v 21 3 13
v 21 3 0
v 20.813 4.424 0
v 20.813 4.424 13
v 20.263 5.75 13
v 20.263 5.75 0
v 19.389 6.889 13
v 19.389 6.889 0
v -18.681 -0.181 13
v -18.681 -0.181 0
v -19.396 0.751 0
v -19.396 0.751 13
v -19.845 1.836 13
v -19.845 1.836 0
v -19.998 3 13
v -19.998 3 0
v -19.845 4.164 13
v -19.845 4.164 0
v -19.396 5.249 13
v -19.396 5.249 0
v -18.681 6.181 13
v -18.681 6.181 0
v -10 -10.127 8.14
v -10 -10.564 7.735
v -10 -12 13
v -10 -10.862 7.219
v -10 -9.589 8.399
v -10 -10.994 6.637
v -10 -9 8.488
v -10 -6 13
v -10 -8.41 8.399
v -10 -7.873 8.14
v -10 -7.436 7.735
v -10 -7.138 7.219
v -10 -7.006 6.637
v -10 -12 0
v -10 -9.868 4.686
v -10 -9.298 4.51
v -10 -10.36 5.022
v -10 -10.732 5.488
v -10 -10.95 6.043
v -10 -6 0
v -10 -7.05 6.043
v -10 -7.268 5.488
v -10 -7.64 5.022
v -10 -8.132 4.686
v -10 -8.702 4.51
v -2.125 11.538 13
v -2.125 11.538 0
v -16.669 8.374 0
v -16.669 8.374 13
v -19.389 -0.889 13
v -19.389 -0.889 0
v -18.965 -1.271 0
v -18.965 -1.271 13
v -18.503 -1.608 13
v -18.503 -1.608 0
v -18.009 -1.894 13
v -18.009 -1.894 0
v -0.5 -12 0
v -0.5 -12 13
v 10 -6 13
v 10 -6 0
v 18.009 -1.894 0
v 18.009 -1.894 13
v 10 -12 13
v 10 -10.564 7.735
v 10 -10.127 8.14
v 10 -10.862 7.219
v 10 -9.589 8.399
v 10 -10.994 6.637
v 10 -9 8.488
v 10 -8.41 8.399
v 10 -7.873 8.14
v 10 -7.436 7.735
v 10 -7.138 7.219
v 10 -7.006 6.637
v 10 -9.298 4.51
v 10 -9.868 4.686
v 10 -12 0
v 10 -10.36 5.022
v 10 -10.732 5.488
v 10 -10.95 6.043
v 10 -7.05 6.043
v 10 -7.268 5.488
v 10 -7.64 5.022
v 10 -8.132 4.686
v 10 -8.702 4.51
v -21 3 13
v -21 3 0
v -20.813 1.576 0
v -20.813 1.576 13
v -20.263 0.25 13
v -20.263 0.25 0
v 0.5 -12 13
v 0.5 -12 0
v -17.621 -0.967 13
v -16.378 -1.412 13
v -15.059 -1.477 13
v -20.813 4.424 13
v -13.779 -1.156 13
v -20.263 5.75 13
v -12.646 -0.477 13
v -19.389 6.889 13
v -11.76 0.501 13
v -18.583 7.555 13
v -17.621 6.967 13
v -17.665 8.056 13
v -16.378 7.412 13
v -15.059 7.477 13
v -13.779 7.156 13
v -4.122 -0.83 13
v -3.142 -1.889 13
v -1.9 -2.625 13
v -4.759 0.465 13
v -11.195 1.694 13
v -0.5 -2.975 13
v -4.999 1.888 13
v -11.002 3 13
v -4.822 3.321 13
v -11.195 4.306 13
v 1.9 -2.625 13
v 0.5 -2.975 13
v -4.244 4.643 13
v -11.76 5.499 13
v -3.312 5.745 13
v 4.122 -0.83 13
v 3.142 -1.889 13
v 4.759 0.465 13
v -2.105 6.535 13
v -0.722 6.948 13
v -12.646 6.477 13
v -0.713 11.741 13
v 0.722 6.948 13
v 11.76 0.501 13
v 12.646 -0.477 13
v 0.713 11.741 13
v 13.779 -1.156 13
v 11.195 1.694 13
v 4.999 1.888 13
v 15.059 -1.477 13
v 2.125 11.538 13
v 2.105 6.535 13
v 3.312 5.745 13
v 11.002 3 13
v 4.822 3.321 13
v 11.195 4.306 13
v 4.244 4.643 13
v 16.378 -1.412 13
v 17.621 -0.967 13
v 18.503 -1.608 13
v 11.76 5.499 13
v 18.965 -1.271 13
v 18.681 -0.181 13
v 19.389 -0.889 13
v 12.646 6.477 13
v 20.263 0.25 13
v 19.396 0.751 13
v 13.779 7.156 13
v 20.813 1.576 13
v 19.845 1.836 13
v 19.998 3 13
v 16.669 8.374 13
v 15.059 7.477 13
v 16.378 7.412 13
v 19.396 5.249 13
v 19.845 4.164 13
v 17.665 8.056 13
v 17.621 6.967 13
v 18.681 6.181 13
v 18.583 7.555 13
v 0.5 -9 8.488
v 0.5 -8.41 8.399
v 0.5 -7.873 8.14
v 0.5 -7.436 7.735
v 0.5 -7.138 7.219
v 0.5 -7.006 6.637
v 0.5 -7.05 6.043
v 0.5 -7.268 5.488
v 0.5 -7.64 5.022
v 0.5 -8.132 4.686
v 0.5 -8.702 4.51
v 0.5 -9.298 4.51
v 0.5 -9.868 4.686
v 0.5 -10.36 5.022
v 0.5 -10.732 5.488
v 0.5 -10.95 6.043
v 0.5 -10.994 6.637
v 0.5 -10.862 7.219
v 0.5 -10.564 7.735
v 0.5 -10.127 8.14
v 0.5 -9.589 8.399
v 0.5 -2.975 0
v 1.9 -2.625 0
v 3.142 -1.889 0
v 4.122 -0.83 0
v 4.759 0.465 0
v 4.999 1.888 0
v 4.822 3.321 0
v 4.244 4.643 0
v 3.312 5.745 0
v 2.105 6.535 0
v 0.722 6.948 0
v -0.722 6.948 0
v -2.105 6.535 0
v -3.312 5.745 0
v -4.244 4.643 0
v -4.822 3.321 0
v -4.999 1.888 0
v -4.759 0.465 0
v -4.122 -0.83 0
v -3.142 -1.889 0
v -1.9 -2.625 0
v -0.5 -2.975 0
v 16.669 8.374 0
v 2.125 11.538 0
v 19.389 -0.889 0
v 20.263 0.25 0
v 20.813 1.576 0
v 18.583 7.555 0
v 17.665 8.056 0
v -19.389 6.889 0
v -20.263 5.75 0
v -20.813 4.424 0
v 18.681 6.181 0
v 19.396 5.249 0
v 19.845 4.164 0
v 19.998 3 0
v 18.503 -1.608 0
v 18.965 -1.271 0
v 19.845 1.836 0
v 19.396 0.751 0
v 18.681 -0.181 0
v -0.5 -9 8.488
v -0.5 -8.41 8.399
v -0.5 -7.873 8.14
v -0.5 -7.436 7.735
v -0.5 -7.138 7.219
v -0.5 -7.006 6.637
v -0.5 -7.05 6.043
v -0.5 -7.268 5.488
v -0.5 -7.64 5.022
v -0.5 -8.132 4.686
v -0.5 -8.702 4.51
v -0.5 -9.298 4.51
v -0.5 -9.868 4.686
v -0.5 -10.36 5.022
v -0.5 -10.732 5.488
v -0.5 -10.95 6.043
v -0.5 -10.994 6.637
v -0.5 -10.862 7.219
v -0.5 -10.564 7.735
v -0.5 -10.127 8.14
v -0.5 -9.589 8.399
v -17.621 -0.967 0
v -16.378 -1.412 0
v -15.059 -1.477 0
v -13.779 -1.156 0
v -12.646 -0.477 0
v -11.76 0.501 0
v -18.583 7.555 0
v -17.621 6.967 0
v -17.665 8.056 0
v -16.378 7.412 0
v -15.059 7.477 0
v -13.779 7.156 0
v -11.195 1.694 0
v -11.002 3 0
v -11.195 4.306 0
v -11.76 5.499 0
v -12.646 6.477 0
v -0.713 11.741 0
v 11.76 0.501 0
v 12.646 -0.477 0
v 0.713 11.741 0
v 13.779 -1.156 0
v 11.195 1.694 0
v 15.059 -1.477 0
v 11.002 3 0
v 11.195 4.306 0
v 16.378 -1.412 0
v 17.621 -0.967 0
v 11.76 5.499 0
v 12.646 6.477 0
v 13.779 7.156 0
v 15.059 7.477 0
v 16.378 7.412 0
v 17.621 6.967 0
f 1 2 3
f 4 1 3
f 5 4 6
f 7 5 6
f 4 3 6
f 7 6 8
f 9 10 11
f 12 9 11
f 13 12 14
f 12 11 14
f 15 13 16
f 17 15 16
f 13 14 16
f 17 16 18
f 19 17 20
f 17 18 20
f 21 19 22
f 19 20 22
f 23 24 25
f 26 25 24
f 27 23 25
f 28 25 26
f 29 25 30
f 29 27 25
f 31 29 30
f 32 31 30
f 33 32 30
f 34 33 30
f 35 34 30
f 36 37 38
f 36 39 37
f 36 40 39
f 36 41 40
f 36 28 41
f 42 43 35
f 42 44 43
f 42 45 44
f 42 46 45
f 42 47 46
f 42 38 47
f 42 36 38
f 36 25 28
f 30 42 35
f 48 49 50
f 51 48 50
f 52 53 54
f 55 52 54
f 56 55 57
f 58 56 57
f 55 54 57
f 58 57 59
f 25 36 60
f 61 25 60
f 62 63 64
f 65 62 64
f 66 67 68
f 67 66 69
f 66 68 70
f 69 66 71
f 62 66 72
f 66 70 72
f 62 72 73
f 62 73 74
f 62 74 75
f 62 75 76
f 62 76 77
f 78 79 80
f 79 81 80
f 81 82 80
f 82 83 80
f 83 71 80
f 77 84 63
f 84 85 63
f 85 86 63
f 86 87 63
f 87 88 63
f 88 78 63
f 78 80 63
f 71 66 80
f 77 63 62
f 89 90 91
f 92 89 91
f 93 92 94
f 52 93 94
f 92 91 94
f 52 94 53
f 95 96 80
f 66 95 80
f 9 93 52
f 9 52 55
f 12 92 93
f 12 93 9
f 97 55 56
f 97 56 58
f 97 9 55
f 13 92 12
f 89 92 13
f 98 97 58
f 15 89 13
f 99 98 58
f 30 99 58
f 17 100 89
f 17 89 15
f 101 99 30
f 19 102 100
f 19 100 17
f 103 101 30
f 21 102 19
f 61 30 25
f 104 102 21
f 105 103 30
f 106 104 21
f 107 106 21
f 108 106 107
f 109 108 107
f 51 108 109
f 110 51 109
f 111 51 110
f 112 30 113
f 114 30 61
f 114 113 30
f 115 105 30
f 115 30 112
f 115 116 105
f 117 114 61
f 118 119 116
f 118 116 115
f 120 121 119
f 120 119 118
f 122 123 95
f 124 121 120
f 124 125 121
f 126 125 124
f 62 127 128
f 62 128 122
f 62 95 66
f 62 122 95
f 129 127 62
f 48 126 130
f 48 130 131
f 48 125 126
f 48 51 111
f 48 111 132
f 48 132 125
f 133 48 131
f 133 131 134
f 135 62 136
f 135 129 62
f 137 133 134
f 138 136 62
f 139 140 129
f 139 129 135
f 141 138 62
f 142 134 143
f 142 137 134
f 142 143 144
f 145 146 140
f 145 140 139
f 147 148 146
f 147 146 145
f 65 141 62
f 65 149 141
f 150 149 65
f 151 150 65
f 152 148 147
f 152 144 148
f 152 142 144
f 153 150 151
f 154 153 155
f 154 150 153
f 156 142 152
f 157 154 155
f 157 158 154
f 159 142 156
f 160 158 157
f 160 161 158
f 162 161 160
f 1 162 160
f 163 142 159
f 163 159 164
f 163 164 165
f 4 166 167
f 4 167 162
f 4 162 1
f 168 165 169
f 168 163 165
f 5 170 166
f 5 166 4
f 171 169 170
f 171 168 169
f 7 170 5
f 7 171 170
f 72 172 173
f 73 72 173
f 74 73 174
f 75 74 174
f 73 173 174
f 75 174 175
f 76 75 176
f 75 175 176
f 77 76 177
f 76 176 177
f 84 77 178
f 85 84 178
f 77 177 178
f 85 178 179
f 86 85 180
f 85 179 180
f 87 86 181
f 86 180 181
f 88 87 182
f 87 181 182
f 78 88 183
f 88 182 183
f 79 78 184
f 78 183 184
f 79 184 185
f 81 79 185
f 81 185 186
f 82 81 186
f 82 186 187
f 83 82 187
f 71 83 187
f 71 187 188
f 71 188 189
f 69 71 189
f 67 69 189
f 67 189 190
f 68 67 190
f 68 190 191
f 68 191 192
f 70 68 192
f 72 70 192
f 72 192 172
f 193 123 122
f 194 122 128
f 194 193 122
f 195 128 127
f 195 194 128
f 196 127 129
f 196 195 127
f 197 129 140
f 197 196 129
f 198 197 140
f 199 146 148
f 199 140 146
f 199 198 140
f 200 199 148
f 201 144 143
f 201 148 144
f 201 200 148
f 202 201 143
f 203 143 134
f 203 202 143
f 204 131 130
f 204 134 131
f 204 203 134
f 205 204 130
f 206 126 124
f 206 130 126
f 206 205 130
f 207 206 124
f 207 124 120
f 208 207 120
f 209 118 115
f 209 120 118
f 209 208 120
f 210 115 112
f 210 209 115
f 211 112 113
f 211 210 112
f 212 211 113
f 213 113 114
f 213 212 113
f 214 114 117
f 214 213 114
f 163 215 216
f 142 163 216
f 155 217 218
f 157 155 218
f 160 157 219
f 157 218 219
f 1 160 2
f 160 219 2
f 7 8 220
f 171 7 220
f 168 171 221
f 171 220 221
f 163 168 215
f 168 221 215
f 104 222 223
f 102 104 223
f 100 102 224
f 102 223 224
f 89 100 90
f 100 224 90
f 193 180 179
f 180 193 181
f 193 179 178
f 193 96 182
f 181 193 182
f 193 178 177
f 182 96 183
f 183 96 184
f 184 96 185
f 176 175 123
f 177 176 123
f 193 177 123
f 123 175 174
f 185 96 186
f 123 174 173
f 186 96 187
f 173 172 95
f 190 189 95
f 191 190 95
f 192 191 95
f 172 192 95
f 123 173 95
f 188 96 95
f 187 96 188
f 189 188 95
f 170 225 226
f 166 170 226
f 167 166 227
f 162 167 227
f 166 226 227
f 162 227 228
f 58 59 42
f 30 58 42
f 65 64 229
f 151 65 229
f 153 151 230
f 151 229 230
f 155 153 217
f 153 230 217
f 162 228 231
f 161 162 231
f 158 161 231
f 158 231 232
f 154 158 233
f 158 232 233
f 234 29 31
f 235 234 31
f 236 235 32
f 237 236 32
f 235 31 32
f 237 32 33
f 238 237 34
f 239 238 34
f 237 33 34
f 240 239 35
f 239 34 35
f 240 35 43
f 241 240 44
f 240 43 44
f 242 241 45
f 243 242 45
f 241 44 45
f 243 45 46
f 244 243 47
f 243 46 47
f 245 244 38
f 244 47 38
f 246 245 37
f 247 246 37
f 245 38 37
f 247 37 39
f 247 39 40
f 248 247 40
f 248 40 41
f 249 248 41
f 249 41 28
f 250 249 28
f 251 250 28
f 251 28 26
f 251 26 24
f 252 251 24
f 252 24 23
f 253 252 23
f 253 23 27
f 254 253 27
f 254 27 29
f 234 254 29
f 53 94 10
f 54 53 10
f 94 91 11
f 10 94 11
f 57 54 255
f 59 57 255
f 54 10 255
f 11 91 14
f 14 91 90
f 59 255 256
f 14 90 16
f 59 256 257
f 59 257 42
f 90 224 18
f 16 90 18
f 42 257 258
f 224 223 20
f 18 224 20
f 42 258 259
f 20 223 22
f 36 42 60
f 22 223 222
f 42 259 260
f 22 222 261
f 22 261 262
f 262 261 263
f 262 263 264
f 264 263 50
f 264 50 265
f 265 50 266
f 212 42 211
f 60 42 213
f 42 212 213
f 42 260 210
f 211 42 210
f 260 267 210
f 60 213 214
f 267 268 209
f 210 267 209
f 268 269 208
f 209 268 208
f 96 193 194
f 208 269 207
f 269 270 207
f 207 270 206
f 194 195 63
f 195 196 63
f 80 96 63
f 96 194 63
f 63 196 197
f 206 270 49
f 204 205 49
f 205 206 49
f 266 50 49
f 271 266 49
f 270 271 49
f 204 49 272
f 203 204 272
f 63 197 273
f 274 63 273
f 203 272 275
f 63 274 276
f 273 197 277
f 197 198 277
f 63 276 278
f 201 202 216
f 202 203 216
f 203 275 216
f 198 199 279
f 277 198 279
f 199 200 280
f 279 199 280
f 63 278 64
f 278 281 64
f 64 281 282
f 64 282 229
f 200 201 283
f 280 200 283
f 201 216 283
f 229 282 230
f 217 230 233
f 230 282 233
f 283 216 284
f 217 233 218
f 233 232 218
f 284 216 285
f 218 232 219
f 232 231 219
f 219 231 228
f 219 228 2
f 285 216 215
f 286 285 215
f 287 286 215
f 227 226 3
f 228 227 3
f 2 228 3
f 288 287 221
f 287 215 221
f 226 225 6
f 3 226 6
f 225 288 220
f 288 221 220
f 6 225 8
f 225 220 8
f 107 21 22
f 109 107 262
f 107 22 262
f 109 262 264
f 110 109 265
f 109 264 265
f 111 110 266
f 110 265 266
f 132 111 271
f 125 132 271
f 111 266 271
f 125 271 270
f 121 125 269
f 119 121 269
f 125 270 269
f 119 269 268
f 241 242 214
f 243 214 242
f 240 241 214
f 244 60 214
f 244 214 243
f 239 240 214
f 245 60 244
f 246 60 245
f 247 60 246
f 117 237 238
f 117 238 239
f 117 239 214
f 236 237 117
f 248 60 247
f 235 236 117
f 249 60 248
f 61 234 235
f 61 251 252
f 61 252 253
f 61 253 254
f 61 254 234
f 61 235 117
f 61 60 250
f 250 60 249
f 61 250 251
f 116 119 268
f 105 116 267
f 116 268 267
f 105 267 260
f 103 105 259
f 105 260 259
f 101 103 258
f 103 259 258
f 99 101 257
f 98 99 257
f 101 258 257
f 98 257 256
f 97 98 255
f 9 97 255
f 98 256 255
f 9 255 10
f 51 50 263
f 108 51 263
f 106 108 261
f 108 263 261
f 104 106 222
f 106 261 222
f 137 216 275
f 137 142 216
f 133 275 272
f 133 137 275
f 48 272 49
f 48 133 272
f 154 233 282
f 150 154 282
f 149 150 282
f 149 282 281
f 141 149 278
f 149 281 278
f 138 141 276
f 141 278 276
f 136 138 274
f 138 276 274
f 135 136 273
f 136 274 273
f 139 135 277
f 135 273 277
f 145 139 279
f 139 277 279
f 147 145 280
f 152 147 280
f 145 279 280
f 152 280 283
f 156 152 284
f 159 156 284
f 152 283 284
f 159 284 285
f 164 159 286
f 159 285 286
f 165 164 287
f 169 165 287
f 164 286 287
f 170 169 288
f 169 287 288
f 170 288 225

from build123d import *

# Parameters (mm, degrees)
SKETCH_1_R          = 5
SKETCH_1_W          = 19.999962028
SKETCH_1_H          = 6.000037038
EXTRUDE_1_DEPTH     = 13
SKETCH_2_R          = 2
CUT_EXTRUDE_1_DEPTH = 36.693120105
SKETCH_3_W          = 1
SKETCH_3_H          = 13
CUT_EXTRUDE_2_DEPTH = 13
FILLET_1_R          = 10


with BuildPart() as part:
    # 草图1 → 凸台-拉伸1 (new body)
    # profile 1 of 10: a face of its own
    with BuildSketch(Plane.XY):
        with BuildLine():
            ThreePointArc((18.008966142, -1.894393619), (10.046238322, 2.288323413), (16.668970702, 8.374337866))
            Line((16.668970702, 8.374337866), (0, 12))
            Line((0, 12), (-16.6689706, 8.374337888))
            ThreePointArc((-16.6689706, 8.374337888), (-12.048865281, 7.282483993), (-10, 3))
            ThreePointArc((-10, 3), (-12.632014098, -1.693043455), (-18.008966133, -1.894393624))
            Line((-18.008966133, -1.894393624), (-9.999981014, -5.999962962))
            Line((-9.999981014, -5.999962962), (9.999981014, -5.999962962))
            Line((9.999981014, -5.999962962), (18.008966142, -1.894393619))
        make_face()
        with Locations(Location((0, 2, 0), (0, 0, 180))):
            Circle(SKETCH_1_R, mode=Mode.SUBTRACT)
    # profile 2 of 10: a face of its own
    with BuildSketch(Plane.XY):
        with BuildLine():
            ThreePointArc((-10, 3), (-12.048865281, 7.282483993), (-16.6689706, 8.374337888))
            ThreePointArc((-16.6689706, 8.374337888), (-18.13580723, 7.827268404), (-19.389087297, 6.889087297))
            Line((-19.389087297, 6.889087297), (-18.680885962, 6.180885962))
            ThreePointArc((-18.680885962, 6.180885962), (-13.778516922, 7.156027793), (-11.001547932, 3))
            ThreePointArc((-11.001547932, 3), (-13.778516922, -1.156027793), (-18.680885962, -0.180885962))
            Line((-18.680885962, -0.180885962), (-19.389087297, -0.889087297))
            ThreePointArc((-19.389087297, -0.889087297), (-18.738276104, -1.445623452), (-18.008966133, -1.894393624))
            ThreePointArc((-18.008966133, -1.894393624), (-12.632014098, -1.693043455), (-10, 3))
        make_face()
    # profile 3 of 10: a face of its own
    with BuildSketch(Plane.XY):
        with BuildLine():
            Line((-18.680885962, 6.180885962), (-19.389087297, 6.889087297))
            ThreePointArc((-19.389087297, 6.889087297), (-20.581337429, 5.104758878), (-21, 3))
            ThreePointArc((-21, 3), (-20.581337429, 0.895241122), (-19.389087297, -0.889087297))
            Line((-19.389087297, -0.889087297), (-18.680885962, -0.180885962))
            ThreePointArc((-18.680885962, -0.180885962), (-19.998452068, 3), (-18.680885962, 6.180885962))
        make_face()
    # profile 4 of 10: a face of its own
    with BuildSketch(Plane.XY):
        with BuildLine():
            ThreePointArc((-10, 3), (-12.048865281, 7.282483993), (-16.6689706, 8.374337888))
            ThreePointArc((-16.6689706, 8.374337888), (-18.13580723, 7.827268404), (-19.389087297, 6.889087297))
            Line((-19.389087297, 6.889087297), (-18.680885962, 6.180885962))
            ThreePointArc((-18.680885962, 6.180885962), (-13.778516922, 7.156027793), (-11.001547932, 3))
            ThreePointArc((-11.001547932, 3), (-13.778516922, -1.156027793), (-18.680885962, -0.180885962))
            Line((-18.680885962, -0.180885962), (-19.389087297, -0.889087297))
            ThreePointArc((-19.389087297, -0.889087297), (-18.738276104, -1.445623452), (-18.008966133, -1.894393624))
            ThreePointArc((-18.008966133, -1.894393624), (-12.632014098, -1.693043455), (-10, 3))
        make_face()
    # profile 5 of 10: a face of its own
    with BuildSketch(Plane.XY):
        with BuildLine():
            Line((-18.680885962, 6.180885962), (-19.389087297, 6.889087297))
            ThreePointArc((-19.389087297, 6.889087297), (-20.581337429, 5.104758878), (-21, 3))
            ThreePointArc((-21, 3), (-20.581337429, 0.895241122), (-19.389087297, -0.889087297))
            Line((-19.389087297, -0.889087297), (-18.680885962, -0.180885962))
            ThreePointArc((-18.680885962, -0.180885962), (-19.998452068, 3), (-18.680885962, 6.180885962))
        make_face()
    # profile 6 of 10: a face of its own
    with BuildSketch(Plane.XY):
        with BuildLine():
            ThreePointArc((18.680885962, -0.180885962), (11.001547932, 3), (18.680885962, 6.180885962))
            Line((18.680885962, 6.180885962), (19.389087297, 6.889087297))
            ThreePointArc((19.389087297, 6.889087297), (18.135807275, 7.82726838), (16.668970702, 8.374337866))
            ThreePointArc((16.668970702, 8.374337866), (10.046238322, 2.288323413), (18.008966142, -1.894393619))
            ThreePointArc((18.008966142, -1.894393619), (18.738276108, -1.445623449), (19.389087297, -0.889087297))
            Line((19.389087297, -0.889087297), (18.680885962, -0.180885962))
        make_face()
    # profile 7 of 10: a face of its own
    with BuildSketch(Plane.XY):
        with BuildLine():
            Line((19.389087297, 6.889087297), (18.680885962, 6.180885962))
            ThreePointArc((18.680885962, 6.180885962), (19.656027793, 4.721483078), (19.998452068, 3))
            ThreePointArc((19.998452068, 3), (19.656027793, 1.278516922), (18.680885962, -0.180885962))
            Line((18.680885962, -0.180885962), (19.389087297, -0.889087297))
            ThreePointArc((19.389087297, -0.889087297), (20.581337429, 0.895241122), (21, 3))
            ThreePointArc((21, 3), (20.581337429, 5.104758878), (19.389087297, 6.889087297))
        make_face()
    # profile 8 of 10: a face of its own
    with BuildSketch(Plane.XY):
        with BuildLine():
            ThreePointArc((18.680885962, -0.180885962), (11.001547932, 3), (18.680885962, 6.180885962))
            Line((18.680885962, 6.180885962), (19.389087297, 6.889087297))
            ThreePointArc((19.389087297, 6.889087297), (18.135807275, 7.82726838), (16.668970702, 8.374337866))
            ThreePointArc((16.668970702, 8.374337866), (10.046238322, 2.288323413), (18.008966142, -1.894393619))
            ThreePointArc((18.008966142, -1.894393619), (18.738276108, -1.445623449), (19.389087297, -0.889087297))
            Line((19.389087297, -0.889087297), (18.680885962, -0.180885962))
        make_face()
    # profile 9 of 10: a face of its own
    with BuildSketch(Plane.XY):
        with BuildLine():
            Line((19.389087297, 6.889087297), (18.680885962, 6.180885962))
            ThreePointArc((18.680885962, 6.180885962), (19.656027793, 4.721483078), (19.998452068, 3))
            ThreePointArc((19.998452068, 3), (19.656027793, 1.278516922), (18.680885962, -0.180885962))
            Line((18.680885962, -0.180885962), (19.389087297, -0.889087297))
            ThreePointArc((19.389087297, -0.889087297), (20.581337429, 0.895241122), (21, 3))
            ThreePointArc((21, 3), (20.581337429, 5.104758878), (19.389087297, 6.889087297))
        make_face()
    # profile 10 of 10: a face of its own
    with BuildSketch(Plane.XY):
        with Locations((0, -8.999981481)):
            Rectangle(SKETCH_1_W, SKETCH_1_H)
    extrude(amount=EXTRUDE_1_DEPTH)

    # 草图2 → 切除-拉伸1 (cut, through all)
    with BuildSketch(Plane.ZY.offset(9.999981014)):
        with Locations((6.487900744, -8.999981481)):
            Circle(SKETCH_2_R)
    extrude(amount=-CUT_EXTRUDE_1_DEPTH, mode=Mode.SUBTRACT)

    # 草图3 → 切除-拉伸2 (cut)
    with BuildSketch(Plane.XZ.offset(12)):
        with Locations((0, 6.5)):
            Rectangle(SKETCH_3_W, SKETCH_3_H)
    extrude(amount=-CUT_EXTRUDE_2_DEPTH, mode=Mode.SUBTRACT)

    # 圆角1
    fillet_1_edges = [part.edges().sort_by_distance(p)[0] for p in [
        (0, 12, 6.5),
    ]]
    fillet(fillet_1_edges, radius=FILLET_1_R)


solid = part.part
